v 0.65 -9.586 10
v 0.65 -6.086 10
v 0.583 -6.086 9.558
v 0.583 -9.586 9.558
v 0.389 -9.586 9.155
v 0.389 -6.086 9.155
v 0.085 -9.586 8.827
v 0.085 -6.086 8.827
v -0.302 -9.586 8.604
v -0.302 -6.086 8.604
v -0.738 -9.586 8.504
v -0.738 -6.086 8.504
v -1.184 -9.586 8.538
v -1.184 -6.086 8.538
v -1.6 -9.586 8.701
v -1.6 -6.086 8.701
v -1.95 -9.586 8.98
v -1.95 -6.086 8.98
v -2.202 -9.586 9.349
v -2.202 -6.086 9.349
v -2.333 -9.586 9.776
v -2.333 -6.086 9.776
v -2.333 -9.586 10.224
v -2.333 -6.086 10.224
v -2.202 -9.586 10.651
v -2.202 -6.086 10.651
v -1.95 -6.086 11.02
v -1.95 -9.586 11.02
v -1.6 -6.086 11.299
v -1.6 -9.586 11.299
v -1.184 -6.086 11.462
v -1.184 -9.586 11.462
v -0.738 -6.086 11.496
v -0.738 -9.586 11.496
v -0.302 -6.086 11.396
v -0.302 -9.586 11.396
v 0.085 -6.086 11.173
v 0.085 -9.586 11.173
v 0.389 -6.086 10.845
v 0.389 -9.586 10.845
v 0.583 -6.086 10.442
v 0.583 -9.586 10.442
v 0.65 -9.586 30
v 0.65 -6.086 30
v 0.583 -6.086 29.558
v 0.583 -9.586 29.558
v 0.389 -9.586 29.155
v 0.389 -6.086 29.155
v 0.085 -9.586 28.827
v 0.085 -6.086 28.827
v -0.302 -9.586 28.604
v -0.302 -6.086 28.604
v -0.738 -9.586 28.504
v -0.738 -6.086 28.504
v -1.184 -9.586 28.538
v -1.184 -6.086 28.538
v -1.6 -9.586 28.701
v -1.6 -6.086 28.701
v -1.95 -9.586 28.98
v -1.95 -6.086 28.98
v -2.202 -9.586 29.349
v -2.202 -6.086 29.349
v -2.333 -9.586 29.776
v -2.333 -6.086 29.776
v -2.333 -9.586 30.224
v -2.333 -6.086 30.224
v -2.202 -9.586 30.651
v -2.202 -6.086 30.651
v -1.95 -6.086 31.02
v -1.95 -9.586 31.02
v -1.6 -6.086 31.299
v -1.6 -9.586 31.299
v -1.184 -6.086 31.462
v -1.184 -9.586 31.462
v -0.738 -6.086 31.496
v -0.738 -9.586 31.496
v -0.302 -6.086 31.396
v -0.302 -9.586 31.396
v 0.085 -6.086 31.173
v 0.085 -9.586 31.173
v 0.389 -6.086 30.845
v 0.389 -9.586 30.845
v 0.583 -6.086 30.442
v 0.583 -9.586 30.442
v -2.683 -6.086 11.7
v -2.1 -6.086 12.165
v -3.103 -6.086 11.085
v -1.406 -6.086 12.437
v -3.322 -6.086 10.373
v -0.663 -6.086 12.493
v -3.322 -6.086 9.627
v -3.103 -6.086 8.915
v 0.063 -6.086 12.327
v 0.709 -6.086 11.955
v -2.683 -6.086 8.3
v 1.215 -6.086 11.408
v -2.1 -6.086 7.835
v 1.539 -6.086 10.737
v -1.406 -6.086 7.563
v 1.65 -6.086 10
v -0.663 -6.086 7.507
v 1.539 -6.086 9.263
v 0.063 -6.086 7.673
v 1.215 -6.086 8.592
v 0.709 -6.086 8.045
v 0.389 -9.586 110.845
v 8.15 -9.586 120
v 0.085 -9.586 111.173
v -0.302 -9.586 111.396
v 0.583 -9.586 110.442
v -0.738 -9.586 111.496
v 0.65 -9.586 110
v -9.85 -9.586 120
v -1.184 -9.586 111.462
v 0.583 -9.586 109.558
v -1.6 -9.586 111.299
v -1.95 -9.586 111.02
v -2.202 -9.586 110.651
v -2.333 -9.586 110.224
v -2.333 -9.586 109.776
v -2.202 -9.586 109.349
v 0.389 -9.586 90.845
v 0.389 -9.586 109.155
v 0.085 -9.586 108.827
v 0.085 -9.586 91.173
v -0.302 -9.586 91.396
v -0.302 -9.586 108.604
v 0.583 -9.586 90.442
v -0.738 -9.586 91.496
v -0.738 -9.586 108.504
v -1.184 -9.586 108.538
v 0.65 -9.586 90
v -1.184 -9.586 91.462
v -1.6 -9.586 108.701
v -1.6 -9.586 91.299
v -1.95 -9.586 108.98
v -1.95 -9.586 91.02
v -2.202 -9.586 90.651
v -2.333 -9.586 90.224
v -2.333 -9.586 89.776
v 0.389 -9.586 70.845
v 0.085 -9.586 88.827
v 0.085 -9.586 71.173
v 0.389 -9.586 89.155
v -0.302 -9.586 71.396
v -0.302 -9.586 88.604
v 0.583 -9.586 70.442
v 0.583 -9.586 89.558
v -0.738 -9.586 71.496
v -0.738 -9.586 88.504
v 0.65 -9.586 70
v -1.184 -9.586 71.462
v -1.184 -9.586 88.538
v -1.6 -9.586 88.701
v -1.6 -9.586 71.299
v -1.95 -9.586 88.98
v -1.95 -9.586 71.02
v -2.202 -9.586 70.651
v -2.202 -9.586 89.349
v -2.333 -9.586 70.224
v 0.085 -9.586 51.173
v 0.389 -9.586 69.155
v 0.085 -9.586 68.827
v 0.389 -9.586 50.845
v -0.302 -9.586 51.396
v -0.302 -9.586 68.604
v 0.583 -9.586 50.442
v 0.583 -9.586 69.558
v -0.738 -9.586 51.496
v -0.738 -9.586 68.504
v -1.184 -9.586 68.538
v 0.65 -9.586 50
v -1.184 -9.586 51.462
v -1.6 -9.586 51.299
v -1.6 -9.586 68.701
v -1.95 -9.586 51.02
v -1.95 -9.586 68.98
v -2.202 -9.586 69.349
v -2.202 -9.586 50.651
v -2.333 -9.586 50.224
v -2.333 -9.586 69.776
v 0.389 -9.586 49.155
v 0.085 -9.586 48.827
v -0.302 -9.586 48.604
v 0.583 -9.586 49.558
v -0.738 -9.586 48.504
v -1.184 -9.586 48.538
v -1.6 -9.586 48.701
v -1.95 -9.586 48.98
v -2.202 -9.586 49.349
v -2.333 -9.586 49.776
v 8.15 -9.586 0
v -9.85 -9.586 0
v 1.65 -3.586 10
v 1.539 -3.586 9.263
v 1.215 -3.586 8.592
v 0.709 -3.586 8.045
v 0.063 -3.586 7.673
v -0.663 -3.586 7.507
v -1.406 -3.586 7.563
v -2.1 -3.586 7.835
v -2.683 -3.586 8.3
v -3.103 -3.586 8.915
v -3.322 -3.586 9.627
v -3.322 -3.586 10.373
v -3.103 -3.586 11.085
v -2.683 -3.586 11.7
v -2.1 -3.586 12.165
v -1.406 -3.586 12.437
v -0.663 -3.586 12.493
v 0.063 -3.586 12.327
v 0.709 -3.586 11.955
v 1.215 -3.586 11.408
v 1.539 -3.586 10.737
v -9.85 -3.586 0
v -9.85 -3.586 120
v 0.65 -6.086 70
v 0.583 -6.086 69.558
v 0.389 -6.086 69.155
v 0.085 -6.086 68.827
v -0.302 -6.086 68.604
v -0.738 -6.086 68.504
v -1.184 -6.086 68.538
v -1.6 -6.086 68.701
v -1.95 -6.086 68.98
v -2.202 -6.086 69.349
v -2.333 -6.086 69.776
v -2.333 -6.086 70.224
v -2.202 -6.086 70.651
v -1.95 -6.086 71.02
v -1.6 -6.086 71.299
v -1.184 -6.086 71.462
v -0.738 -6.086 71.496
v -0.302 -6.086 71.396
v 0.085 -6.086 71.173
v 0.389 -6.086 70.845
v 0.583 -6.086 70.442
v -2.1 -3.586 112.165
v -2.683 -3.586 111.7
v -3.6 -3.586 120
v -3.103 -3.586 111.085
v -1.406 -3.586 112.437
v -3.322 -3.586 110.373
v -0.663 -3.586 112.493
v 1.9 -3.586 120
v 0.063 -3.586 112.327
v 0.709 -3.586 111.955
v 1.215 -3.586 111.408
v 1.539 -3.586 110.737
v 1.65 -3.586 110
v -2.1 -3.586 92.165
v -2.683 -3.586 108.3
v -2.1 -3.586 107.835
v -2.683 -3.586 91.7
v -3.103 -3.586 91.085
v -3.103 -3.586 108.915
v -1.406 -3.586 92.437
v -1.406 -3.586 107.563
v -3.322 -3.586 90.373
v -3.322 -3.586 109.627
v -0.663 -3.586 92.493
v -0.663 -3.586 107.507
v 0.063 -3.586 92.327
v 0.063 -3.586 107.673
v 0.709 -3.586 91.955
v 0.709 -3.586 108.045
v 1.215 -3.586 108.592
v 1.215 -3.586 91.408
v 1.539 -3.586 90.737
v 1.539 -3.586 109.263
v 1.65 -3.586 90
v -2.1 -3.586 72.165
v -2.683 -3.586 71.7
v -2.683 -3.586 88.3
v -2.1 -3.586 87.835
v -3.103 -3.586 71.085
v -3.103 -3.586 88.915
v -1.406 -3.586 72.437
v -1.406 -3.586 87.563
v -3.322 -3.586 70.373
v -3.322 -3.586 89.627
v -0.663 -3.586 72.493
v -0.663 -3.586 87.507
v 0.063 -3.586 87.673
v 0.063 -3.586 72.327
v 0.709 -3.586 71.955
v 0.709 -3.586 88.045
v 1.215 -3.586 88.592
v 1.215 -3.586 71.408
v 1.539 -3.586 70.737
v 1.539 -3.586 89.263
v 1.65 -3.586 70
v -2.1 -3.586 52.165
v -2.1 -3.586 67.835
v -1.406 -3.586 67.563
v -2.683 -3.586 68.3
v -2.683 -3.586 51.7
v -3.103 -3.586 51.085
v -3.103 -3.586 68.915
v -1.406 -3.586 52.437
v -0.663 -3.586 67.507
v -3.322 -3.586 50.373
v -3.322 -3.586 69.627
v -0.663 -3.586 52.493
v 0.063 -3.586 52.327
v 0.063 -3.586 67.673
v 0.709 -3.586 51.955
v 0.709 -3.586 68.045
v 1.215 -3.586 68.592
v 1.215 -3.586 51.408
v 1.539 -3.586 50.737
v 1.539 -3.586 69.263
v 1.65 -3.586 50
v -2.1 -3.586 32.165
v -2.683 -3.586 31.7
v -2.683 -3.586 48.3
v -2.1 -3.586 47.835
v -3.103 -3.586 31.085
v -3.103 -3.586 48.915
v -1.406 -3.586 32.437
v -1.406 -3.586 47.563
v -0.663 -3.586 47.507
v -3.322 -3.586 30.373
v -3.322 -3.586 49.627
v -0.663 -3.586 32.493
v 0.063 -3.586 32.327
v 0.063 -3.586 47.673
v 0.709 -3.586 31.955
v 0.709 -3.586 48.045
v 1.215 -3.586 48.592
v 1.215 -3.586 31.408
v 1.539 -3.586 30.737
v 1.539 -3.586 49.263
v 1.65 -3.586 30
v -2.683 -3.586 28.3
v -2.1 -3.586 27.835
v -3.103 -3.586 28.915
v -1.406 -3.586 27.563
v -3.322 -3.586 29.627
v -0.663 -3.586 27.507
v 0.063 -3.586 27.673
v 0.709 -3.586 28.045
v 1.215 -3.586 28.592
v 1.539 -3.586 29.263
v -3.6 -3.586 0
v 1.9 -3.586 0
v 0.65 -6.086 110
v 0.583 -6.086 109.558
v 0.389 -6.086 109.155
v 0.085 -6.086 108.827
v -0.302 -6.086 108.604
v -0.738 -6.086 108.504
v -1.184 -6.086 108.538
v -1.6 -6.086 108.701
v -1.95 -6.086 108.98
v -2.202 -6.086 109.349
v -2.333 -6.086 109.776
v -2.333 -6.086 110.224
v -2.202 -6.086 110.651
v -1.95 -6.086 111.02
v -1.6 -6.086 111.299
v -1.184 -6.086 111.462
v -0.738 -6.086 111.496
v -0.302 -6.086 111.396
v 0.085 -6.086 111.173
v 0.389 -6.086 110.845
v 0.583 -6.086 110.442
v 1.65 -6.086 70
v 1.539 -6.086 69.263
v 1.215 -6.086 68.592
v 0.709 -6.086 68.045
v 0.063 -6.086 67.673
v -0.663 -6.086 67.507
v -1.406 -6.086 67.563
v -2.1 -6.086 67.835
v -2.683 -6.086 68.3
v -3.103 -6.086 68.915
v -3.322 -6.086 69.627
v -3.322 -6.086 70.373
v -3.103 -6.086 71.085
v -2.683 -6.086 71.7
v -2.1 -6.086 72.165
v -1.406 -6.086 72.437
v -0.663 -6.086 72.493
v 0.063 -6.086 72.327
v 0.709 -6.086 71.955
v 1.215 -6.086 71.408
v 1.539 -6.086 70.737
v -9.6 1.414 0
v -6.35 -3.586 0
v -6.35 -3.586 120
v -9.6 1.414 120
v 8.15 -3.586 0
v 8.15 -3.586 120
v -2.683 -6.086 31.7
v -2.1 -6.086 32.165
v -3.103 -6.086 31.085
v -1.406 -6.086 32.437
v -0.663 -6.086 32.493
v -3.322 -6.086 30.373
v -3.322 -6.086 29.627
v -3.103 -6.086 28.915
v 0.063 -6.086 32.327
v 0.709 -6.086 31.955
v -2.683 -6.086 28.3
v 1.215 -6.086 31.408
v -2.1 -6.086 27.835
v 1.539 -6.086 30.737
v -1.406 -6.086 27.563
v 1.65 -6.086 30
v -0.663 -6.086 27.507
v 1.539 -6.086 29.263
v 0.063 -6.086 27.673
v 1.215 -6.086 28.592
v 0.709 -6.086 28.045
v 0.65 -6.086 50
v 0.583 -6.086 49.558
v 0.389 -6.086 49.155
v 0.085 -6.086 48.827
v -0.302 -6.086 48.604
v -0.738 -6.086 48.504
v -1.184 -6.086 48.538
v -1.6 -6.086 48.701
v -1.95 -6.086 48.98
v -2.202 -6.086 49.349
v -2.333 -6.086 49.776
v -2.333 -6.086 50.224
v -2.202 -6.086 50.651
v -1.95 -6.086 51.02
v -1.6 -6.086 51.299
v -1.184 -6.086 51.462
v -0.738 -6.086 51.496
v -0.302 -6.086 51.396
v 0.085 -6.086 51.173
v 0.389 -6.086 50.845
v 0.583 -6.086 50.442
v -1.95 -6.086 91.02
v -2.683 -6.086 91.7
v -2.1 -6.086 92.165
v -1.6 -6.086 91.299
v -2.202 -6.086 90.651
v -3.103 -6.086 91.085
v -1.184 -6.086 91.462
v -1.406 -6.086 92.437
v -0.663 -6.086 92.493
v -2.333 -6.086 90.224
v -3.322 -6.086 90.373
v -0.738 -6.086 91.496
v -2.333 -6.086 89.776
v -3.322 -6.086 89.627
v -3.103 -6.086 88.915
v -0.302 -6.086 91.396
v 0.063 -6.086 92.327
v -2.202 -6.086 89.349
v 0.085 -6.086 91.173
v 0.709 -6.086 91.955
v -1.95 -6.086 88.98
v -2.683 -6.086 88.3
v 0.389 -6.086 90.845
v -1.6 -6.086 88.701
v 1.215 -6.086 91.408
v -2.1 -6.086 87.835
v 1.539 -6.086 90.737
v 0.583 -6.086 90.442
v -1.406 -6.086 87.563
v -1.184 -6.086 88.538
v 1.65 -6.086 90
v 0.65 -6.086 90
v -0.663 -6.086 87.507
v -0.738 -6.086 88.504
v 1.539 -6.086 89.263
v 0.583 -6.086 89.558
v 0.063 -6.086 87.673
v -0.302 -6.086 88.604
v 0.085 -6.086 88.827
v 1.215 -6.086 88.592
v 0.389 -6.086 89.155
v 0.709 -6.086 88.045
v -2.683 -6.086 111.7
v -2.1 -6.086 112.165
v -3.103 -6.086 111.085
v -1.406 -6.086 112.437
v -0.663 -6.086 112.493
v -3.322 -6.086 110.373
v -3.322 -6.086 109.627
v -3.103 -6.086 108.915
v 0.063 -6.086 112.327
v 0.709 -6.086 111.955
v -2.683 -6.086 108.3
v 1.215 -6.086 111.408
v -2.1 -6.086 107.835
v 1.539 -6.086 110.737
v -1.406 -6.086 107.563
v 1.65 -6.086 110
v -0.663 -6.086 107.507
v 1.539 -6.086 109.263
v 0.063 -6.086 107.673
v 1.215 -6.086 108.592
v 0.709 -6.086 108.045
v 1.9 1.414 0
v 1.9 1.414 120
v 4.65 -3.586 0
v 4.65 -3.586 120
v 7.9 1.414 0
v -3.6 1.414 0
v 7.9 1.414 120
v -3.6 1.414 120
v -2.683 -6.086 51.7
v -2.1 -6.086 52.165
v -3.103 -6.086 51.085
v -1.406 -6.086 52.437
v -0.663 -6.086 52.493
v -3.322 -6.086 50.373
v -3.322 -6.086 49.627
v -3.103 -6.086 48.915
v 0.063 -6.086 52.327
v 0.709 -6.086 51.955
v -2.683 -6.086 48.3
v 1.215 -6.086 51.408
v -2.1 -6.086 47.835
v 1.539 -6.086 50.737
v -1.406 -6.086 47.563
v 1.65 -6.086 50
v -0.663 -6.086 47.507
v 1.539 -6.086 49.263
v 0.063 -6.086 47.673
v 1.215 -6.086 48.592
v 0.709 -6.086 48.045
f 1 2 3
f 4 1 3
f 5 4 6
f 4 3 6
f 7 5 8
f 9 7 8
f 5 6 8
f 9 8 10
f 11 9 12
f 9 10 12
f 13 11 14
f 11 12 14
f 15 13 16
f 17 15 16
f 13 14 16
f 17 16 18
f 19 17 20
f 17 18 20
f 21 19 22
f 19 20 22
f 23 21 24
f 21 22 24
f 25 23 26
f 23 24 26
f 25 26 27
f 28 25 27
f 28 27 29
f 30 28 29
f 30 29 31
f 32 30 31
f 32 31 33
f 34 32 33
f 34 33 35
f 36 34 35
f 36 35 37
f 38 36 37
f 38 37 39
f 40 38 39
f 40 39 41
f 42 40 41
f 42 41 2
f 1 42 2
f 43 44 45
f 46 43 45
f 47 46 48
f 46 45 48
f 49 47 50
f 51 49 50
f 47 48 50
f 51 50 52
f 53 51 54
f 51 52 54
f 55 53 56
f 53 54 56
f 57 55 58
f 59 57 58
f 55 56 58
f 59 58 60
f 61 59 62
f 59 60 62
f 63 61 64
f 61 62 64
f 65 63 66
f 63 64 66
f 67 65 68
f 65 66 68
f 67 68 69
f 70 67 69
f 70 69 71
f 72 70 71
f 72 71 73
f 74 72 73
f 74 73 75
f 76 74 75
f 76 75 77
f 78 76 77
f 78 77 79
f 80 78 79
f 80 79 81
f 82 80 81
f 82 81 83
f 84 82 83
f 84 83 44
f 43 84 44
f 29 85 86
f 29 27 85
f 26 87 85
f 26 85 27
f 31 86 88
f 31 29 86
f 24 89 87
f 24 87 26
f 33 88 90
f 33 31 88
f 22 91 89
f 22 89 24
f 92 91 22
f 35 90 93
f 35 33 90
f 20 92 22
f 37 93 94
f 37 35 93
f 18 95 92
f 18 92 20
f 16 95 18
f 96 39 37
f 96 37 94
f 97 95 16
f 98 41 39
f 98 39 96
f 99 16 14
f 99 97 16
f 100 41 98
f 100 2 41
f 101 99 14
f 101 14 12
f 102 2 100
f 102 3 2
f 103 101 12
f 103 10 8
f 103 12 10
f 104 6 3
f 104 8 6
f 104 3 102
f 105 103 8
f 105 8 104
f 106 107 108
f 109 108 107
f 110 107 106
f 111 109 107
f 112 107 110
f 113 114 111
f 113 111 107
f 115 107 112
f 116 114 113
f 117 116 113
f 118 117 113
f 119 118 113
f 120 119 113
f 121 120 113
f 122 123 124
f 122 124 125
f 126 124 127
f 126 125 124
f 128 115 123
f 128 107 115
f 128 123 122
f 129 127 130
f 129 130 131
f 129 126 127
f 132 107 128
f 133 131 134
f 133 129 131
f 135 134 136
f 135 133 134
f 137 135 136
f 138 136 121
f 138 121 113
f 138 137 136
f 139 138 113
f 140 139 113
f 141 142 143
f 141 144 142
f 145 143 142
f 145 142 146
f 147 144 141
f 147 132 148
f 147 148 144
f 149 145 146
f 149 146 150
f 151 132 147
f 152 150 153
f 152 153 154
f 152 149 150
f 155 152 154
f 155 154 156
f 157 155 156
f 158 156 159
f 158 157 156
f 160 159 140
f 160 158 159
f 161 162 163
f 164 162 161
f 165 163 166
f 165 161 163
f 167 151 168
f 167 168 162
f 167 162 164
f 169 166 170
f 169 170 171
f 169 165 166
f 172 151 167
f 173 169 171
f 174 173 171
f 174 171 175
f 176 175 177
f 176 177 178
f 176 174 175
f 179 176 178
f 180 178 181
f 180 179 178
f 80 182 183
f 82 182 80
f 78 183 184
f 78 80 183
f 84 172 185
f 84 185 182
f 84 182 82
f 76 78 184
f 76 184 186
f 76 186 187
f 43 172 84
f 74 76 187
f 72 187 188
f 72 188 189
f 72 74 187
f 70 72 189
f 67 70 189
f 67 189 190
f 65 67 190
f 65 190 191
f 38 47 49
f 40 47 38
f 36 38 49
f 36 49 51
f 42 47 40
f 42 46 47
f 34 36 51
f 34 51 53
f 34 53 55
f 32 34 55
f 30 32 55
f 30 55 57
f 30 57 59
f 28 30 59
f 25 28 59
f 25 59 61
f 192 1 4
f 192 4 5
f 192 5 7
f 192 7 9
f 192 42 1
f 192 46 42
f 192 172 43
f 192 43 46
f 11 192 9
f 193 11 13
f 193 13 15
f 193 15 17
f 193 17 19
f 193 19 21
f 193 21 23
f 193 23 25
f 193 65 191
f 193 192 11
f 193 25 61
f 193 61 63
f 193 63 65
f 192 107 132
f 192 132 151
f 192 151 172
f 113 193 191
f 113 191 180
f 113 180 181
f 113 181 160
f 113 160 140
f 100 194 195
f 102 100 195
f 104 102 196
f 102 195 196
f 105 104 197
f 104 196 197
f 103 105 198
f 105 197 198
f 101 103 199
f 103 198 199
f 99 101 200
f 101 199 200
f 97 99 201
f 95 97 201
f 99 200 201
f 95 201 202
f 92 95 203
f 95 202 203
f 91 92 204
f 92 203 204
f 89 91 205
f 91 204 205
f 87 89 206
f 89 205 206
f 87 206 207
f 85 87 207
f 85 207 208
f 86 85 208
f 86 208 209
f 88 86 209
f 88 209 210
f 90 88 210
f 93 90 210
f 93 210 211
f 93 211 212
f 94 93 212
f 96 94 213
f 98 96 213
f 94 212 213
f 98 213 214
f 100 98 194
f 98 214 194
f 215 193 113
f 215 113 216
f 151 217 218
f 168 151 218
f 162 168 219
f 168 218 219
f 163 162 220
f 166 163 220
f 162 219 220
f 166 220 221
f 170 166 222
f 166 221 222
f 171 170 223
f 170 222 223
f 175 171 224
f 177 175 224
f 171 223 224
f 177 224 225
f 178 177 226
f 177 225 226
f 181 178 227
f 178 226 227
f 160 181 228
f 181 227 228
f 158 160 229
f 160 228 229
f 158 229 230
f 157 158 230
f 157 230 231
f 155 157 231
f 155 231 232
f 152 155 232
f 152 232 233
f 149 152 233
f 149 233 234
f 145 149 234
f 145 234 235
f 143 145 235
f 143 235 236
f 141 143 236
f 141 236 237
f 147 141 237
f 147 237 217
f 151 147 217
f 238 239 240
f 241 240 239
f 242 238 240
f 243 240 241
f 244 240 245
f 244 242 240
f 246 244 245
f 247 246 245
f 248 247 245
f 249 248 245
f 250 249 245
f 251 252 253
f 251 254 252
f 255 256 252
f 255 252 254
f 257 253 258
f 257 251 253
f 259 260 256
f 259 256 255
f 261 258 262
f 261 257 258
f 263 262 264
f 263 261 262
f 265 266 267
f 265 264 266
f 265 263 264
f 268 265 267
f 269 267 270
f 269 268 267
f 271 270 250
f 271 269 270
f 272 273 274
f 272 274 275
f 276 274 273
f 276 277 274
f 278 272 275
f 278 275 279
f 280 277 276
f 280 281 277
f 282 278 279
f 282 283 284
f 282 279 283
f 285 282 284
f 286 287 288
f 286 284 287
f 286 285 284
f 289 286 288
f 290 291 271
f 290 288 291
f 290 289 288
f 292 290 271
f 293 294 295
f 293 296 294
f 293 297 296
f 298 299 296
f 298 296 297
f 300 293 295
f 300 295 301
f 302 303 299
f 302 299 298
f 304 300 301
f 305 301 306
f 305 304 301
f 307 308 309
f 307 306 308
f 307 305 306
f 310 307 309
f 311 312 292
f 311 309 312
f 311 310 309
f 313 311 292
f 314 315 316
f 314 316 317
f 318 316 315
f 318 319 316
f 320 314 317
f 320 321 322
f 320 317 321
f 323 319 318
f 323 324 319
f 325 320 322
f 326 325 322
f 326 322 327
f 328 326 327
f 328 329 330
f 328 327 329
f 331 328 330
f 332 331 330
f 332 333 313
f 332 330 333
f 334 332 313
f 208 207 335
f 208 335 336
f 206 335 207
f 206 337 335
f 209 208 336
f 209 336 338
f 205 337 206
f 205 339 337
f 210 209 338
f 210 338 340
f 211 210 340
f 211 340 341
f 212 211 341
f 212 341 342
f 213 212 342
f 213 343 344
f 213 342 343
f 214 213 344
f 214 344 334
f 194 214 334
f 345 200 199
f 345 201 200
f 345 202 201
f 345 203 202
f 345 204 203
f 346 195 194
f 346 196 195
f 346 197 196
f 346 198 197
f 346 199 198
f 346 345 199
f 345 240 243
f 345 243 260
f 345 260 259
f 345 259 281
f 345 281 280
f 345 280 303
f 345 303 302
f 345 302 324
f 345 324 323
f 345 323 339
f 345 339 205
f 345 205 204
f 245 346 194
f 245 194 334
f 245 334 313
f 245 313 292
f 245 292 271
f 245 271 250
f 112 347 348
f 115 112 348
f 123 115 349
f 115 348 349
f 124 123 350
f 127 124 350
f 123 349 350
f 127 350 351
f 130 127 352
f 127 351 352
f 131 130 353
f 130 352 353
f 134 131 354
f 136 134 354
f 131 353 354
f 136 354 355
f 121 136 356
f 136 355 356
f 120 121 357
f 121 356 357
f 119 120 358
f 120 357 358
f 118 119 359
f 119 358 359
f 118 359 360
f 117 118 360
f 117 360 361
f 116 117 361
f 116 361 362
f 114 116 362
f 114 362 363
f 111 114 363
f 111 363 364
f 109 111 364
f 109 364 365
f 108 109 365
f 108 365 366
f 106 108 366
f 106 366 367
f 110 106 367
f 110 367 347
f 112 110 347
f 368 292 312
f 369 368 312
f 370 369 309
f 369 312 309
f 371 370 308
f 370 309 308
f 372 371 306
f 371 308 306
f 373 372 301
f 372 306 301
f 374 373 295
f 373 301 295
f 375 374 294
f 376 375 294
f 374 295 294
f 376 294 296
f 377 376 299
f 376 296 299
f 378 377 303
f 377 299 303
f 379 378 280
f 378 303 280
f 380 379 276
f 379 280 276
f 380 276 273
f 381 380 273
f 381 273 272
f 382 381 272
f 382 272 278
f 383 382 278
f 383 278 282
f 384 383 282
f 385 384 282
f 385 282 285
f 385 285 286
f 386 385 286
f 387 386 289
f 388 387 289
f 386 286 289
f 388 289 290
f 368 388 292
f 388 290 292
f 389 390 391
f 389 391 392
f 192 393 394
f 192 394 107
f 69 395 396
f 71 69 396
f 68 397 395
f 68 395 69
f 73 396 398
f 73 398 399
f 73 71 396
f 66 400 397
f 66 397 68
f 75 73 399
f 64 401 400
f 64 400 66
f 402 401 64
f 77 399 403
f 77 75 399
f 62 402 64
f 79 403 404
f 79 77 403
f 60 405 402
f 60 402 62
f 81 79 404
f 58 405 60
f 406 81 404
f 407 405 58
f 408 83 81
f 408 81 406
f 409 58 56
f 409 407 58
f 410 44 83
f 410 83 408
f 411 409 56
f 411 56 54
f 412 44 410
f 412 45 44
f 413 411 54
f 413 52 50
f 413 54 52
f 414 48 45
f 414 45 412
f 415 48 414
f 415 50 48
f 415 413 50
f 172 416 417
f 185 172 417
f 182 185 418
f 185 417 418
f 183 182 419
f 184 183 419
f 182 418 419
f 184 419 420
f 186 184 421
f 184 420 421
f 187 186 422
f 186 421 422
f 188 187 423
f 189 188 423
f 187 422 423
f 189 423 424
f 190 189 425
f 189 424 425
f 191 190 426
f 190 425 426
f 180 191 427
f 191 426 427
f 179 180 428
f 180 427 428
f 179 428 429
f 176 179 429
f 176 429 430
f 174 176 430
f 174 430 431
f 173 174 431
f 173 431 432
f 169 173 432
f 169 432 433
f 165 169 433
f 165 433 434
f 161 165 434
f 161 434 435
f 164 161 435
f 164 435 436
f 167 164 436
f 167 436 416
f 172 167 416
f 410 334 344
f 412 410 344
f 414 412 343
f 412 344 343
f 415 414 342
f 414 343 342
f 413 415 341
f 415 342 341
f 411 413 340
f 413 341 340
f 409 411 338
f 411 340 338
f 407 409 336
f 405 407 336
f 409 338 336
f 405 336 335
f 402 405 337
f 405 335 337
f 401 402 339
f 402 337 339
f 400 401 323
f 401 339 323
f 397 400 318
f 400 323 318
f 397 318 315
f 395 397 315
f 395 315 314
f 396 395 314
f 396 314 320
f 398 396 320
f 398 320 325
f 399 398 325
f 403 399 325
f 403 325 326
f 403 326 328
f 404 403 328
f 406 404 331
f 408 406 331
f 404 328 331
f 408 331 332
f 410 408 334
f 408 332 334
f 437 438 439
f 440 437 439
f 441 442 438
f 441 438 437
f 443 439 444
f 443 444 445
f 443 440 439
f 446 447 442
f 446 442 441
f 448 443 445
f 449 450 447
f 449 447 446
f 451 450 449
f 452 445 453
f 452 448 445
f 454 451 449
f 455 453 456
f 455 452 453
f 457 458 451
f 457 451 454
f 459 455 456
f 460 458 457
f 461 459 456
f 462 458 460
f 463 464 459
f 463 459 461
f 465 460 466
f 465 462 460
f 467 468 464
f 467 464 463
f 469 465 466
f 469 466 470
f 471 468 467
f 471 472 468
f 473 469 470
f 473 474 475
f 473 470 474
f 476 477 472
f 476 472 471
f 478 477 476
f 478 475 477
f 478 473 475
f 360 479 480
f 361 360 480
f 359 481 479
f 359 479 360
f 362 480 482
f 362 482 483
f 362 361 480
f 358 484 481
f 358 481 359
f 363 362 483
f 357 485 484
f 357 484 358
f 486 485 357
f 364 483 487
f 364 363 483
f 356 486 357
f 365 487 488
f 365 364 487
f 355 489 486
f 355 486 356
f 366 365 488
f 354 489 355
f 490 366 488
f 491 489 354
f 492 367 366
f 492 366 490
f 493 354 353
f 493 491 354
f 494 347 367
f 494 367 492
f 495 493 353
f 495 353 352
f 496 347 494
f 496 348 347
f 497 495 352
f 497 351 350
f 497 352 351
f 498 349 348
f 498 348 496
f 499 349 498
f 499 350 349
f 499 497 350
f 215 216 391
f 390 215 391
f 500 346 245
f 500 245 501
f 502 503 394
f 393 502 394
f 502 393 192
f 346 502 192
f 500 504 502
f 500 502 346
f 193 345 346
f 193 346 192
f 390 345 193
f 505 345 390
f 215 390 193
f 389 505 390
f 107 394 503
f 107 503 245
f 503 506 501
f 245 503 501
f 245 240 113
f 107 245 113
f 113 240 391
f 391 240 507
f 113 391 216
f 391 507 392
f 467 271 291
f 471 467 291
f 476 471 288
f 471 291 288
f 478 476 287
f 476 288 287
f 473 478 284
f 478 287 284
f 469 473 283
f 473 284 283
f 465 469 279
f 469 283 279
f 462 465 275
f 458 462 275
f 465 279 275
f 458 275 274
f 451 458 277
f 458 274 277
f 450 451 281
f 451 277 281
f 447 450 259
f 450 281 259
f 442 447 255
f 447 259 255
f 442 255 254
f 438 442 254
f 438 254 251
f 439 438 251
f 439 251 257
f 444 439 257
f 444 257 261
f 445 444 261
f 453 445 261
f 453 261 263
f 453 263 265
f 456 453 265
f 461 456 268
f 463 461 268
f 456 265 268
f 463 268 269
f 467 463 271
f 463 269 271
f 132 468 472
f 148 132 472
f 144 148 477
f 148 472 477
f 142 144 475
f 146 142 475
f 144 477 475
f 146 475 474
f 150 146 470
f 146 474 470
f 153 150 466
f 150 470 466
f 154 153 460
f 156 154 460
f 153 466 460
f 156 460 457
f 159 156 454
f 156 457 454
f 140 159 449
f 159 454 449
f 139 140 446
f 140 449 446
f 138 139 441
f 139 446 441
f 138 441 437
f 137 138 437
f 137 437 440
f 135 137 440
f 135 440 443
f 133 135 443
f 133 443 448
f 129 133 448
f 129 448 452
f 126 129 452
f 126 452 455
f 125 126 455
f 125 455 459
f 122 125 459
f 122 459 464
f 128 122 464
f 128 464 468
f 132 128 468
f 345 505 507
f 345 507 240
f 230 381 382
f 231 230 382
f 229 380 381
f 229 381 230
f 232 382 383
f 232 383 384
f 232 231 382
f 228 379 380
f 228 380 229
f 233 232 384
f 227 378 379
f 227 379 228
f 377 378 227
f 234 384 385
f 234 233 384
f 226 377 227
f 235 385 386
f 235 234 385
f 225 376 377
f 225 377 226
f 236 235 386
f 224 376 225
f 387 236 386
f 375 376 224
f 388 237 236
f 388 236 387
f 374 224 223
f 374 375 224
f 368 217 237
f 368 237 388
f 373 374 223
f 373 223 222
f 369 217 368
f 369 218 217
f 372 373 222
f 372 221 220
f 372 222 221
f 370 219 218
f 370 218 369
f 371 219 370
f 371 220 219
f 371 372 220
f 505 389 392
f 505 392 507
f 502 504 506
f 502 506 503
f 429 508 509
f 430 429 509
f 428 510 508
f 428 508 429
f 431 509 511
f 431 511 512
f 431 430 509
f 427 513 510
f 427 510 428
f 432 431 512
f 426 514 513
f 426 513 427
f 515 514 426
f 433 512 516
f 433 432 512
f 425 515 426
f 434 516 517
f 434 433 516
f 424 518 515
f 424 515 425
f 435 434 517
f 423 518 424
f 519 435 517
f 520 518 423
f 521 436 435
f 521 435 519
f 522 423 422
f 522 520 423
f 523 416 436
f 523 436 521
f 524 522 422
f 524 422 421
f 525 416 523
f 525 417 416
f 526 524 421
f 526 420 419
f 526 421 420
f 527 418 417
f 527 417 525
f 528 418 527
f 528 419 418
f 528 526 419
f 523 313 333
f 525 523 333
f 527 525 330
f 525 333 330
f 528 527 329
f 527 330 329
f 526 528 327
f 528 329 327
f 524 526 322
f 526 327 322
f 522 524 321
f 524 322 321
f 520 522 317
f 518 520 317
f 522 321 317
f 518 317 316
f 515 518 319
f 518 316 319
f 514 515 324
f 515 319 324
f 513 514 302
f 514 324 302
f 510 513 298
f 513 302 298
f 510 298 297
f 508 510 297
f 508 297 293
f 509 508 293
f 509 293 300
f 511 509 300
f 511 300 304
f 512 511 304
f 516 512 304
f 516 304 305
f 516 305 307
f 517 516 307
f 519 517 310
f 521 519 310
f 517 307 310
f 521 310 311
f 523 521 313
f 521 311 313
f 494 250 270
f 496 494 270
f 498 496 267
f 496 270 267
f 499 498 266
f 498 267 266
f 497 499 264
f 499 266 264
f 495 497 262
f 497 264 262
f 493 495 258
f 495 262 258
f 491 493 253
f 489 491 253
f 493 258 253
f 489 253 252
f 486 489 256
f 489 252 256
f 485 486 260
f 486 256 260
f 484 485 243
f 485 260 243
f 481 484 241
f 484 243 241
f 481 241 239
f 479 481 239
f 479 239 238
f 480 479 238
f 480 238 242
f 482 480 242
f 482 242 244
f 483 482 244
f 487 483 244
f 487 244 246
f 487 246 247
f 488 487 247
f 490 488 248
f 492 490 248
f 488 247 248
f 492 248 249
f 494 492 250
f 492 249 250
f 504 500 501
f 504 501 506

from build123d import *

# Parameters (mm, degrees)
BOSS_EXTRUDE1_DEPTH = 120
SKETCH2_R           = 2.5
CUT_EXTRUDE1_DEPTH  = 2.5
SKETCH3_R           = 1.5
CUT_EXTRUDE2_DEPTH  = 4.5


with BuildPart() as part:
    # Sketch1 → Boss-Extrude1 (new body)
    with BuildSketch(Plane.XY):
        Polygon((-9.600162866, 1.413680782), (-3.600162866, 1.413680782), (-3.600162866, -3.586319218), (1.899837134, -3.586319218), (1.899837134, 1.413680782), (7.899837134, 1.413680782), (4.649837134, -3.586319218), (8.149837134, -3.586319218), (8.149837134, -9.586319218), (-9.850162866, -9.586319218), (-9.850162866, -3.586319218), (-6.350162866, -3.586319218), align=None)
    extrude(amount=BOSS_EXTRUDE1_DEPTH)

    # Sketch2 → Cut-Extrude1 (cut)
    with BuildSketch(Plane(origin=(0, -3.586319218, 0), x_dir=(1, 0, 0), z_dir=(0, 1, 0))):
        with Locations((-0.850162866, -10)):
            Circle(SKETCH2_R)
        with Locations((-0.850162866, -30)):
            Circle(SKETCH2_R)
        with Locations((-0.850162866, -50)):
            Circle(SKETCH2_R)
        with Locations((-0.850162866, -70)):
            Circle(SKETCH2_R)
        with Locations((-0.850162866, -90)):
            Circle(SKETCH2_R)
        with Locations((-0.850162866, -110)):
            Circle(SKETCH2_R)
    extrude(amount=-CUT_EXTRUDE1_DEPTH, mode=Mode.SUBTRACT)

    # Sketch3 → Cut-Extrude2 (cut, through all)
    with BuildSketch(Plane(origin=(0, -6.086319218, 0), x_dir=(1, 0, 0), z_dir=(0, 1, 0))):
        with Locations((-0.850162866, -10)):
            Circle(SKETCH3_R)
        with Locations((-0.850162866, -30)):
            Circle(SKETCH3_R)
        with Locations((-0.850162866, -50)):
            Circle(SKETCH3_R)
        with Locations((-0.850162866, -70)):
            Circle(SKETCH3_R)
        with Locations((-0.850162866, -90)):
            Circle(SKETCH3_R)
        with Locations((-0.850162866, -110)):
            Circle(SKETCH3_R)
    extrude(amount=-CUT_EXTRUDE2_DEPTH, mode=Mode.SUBTRACT)


solid = part.part
